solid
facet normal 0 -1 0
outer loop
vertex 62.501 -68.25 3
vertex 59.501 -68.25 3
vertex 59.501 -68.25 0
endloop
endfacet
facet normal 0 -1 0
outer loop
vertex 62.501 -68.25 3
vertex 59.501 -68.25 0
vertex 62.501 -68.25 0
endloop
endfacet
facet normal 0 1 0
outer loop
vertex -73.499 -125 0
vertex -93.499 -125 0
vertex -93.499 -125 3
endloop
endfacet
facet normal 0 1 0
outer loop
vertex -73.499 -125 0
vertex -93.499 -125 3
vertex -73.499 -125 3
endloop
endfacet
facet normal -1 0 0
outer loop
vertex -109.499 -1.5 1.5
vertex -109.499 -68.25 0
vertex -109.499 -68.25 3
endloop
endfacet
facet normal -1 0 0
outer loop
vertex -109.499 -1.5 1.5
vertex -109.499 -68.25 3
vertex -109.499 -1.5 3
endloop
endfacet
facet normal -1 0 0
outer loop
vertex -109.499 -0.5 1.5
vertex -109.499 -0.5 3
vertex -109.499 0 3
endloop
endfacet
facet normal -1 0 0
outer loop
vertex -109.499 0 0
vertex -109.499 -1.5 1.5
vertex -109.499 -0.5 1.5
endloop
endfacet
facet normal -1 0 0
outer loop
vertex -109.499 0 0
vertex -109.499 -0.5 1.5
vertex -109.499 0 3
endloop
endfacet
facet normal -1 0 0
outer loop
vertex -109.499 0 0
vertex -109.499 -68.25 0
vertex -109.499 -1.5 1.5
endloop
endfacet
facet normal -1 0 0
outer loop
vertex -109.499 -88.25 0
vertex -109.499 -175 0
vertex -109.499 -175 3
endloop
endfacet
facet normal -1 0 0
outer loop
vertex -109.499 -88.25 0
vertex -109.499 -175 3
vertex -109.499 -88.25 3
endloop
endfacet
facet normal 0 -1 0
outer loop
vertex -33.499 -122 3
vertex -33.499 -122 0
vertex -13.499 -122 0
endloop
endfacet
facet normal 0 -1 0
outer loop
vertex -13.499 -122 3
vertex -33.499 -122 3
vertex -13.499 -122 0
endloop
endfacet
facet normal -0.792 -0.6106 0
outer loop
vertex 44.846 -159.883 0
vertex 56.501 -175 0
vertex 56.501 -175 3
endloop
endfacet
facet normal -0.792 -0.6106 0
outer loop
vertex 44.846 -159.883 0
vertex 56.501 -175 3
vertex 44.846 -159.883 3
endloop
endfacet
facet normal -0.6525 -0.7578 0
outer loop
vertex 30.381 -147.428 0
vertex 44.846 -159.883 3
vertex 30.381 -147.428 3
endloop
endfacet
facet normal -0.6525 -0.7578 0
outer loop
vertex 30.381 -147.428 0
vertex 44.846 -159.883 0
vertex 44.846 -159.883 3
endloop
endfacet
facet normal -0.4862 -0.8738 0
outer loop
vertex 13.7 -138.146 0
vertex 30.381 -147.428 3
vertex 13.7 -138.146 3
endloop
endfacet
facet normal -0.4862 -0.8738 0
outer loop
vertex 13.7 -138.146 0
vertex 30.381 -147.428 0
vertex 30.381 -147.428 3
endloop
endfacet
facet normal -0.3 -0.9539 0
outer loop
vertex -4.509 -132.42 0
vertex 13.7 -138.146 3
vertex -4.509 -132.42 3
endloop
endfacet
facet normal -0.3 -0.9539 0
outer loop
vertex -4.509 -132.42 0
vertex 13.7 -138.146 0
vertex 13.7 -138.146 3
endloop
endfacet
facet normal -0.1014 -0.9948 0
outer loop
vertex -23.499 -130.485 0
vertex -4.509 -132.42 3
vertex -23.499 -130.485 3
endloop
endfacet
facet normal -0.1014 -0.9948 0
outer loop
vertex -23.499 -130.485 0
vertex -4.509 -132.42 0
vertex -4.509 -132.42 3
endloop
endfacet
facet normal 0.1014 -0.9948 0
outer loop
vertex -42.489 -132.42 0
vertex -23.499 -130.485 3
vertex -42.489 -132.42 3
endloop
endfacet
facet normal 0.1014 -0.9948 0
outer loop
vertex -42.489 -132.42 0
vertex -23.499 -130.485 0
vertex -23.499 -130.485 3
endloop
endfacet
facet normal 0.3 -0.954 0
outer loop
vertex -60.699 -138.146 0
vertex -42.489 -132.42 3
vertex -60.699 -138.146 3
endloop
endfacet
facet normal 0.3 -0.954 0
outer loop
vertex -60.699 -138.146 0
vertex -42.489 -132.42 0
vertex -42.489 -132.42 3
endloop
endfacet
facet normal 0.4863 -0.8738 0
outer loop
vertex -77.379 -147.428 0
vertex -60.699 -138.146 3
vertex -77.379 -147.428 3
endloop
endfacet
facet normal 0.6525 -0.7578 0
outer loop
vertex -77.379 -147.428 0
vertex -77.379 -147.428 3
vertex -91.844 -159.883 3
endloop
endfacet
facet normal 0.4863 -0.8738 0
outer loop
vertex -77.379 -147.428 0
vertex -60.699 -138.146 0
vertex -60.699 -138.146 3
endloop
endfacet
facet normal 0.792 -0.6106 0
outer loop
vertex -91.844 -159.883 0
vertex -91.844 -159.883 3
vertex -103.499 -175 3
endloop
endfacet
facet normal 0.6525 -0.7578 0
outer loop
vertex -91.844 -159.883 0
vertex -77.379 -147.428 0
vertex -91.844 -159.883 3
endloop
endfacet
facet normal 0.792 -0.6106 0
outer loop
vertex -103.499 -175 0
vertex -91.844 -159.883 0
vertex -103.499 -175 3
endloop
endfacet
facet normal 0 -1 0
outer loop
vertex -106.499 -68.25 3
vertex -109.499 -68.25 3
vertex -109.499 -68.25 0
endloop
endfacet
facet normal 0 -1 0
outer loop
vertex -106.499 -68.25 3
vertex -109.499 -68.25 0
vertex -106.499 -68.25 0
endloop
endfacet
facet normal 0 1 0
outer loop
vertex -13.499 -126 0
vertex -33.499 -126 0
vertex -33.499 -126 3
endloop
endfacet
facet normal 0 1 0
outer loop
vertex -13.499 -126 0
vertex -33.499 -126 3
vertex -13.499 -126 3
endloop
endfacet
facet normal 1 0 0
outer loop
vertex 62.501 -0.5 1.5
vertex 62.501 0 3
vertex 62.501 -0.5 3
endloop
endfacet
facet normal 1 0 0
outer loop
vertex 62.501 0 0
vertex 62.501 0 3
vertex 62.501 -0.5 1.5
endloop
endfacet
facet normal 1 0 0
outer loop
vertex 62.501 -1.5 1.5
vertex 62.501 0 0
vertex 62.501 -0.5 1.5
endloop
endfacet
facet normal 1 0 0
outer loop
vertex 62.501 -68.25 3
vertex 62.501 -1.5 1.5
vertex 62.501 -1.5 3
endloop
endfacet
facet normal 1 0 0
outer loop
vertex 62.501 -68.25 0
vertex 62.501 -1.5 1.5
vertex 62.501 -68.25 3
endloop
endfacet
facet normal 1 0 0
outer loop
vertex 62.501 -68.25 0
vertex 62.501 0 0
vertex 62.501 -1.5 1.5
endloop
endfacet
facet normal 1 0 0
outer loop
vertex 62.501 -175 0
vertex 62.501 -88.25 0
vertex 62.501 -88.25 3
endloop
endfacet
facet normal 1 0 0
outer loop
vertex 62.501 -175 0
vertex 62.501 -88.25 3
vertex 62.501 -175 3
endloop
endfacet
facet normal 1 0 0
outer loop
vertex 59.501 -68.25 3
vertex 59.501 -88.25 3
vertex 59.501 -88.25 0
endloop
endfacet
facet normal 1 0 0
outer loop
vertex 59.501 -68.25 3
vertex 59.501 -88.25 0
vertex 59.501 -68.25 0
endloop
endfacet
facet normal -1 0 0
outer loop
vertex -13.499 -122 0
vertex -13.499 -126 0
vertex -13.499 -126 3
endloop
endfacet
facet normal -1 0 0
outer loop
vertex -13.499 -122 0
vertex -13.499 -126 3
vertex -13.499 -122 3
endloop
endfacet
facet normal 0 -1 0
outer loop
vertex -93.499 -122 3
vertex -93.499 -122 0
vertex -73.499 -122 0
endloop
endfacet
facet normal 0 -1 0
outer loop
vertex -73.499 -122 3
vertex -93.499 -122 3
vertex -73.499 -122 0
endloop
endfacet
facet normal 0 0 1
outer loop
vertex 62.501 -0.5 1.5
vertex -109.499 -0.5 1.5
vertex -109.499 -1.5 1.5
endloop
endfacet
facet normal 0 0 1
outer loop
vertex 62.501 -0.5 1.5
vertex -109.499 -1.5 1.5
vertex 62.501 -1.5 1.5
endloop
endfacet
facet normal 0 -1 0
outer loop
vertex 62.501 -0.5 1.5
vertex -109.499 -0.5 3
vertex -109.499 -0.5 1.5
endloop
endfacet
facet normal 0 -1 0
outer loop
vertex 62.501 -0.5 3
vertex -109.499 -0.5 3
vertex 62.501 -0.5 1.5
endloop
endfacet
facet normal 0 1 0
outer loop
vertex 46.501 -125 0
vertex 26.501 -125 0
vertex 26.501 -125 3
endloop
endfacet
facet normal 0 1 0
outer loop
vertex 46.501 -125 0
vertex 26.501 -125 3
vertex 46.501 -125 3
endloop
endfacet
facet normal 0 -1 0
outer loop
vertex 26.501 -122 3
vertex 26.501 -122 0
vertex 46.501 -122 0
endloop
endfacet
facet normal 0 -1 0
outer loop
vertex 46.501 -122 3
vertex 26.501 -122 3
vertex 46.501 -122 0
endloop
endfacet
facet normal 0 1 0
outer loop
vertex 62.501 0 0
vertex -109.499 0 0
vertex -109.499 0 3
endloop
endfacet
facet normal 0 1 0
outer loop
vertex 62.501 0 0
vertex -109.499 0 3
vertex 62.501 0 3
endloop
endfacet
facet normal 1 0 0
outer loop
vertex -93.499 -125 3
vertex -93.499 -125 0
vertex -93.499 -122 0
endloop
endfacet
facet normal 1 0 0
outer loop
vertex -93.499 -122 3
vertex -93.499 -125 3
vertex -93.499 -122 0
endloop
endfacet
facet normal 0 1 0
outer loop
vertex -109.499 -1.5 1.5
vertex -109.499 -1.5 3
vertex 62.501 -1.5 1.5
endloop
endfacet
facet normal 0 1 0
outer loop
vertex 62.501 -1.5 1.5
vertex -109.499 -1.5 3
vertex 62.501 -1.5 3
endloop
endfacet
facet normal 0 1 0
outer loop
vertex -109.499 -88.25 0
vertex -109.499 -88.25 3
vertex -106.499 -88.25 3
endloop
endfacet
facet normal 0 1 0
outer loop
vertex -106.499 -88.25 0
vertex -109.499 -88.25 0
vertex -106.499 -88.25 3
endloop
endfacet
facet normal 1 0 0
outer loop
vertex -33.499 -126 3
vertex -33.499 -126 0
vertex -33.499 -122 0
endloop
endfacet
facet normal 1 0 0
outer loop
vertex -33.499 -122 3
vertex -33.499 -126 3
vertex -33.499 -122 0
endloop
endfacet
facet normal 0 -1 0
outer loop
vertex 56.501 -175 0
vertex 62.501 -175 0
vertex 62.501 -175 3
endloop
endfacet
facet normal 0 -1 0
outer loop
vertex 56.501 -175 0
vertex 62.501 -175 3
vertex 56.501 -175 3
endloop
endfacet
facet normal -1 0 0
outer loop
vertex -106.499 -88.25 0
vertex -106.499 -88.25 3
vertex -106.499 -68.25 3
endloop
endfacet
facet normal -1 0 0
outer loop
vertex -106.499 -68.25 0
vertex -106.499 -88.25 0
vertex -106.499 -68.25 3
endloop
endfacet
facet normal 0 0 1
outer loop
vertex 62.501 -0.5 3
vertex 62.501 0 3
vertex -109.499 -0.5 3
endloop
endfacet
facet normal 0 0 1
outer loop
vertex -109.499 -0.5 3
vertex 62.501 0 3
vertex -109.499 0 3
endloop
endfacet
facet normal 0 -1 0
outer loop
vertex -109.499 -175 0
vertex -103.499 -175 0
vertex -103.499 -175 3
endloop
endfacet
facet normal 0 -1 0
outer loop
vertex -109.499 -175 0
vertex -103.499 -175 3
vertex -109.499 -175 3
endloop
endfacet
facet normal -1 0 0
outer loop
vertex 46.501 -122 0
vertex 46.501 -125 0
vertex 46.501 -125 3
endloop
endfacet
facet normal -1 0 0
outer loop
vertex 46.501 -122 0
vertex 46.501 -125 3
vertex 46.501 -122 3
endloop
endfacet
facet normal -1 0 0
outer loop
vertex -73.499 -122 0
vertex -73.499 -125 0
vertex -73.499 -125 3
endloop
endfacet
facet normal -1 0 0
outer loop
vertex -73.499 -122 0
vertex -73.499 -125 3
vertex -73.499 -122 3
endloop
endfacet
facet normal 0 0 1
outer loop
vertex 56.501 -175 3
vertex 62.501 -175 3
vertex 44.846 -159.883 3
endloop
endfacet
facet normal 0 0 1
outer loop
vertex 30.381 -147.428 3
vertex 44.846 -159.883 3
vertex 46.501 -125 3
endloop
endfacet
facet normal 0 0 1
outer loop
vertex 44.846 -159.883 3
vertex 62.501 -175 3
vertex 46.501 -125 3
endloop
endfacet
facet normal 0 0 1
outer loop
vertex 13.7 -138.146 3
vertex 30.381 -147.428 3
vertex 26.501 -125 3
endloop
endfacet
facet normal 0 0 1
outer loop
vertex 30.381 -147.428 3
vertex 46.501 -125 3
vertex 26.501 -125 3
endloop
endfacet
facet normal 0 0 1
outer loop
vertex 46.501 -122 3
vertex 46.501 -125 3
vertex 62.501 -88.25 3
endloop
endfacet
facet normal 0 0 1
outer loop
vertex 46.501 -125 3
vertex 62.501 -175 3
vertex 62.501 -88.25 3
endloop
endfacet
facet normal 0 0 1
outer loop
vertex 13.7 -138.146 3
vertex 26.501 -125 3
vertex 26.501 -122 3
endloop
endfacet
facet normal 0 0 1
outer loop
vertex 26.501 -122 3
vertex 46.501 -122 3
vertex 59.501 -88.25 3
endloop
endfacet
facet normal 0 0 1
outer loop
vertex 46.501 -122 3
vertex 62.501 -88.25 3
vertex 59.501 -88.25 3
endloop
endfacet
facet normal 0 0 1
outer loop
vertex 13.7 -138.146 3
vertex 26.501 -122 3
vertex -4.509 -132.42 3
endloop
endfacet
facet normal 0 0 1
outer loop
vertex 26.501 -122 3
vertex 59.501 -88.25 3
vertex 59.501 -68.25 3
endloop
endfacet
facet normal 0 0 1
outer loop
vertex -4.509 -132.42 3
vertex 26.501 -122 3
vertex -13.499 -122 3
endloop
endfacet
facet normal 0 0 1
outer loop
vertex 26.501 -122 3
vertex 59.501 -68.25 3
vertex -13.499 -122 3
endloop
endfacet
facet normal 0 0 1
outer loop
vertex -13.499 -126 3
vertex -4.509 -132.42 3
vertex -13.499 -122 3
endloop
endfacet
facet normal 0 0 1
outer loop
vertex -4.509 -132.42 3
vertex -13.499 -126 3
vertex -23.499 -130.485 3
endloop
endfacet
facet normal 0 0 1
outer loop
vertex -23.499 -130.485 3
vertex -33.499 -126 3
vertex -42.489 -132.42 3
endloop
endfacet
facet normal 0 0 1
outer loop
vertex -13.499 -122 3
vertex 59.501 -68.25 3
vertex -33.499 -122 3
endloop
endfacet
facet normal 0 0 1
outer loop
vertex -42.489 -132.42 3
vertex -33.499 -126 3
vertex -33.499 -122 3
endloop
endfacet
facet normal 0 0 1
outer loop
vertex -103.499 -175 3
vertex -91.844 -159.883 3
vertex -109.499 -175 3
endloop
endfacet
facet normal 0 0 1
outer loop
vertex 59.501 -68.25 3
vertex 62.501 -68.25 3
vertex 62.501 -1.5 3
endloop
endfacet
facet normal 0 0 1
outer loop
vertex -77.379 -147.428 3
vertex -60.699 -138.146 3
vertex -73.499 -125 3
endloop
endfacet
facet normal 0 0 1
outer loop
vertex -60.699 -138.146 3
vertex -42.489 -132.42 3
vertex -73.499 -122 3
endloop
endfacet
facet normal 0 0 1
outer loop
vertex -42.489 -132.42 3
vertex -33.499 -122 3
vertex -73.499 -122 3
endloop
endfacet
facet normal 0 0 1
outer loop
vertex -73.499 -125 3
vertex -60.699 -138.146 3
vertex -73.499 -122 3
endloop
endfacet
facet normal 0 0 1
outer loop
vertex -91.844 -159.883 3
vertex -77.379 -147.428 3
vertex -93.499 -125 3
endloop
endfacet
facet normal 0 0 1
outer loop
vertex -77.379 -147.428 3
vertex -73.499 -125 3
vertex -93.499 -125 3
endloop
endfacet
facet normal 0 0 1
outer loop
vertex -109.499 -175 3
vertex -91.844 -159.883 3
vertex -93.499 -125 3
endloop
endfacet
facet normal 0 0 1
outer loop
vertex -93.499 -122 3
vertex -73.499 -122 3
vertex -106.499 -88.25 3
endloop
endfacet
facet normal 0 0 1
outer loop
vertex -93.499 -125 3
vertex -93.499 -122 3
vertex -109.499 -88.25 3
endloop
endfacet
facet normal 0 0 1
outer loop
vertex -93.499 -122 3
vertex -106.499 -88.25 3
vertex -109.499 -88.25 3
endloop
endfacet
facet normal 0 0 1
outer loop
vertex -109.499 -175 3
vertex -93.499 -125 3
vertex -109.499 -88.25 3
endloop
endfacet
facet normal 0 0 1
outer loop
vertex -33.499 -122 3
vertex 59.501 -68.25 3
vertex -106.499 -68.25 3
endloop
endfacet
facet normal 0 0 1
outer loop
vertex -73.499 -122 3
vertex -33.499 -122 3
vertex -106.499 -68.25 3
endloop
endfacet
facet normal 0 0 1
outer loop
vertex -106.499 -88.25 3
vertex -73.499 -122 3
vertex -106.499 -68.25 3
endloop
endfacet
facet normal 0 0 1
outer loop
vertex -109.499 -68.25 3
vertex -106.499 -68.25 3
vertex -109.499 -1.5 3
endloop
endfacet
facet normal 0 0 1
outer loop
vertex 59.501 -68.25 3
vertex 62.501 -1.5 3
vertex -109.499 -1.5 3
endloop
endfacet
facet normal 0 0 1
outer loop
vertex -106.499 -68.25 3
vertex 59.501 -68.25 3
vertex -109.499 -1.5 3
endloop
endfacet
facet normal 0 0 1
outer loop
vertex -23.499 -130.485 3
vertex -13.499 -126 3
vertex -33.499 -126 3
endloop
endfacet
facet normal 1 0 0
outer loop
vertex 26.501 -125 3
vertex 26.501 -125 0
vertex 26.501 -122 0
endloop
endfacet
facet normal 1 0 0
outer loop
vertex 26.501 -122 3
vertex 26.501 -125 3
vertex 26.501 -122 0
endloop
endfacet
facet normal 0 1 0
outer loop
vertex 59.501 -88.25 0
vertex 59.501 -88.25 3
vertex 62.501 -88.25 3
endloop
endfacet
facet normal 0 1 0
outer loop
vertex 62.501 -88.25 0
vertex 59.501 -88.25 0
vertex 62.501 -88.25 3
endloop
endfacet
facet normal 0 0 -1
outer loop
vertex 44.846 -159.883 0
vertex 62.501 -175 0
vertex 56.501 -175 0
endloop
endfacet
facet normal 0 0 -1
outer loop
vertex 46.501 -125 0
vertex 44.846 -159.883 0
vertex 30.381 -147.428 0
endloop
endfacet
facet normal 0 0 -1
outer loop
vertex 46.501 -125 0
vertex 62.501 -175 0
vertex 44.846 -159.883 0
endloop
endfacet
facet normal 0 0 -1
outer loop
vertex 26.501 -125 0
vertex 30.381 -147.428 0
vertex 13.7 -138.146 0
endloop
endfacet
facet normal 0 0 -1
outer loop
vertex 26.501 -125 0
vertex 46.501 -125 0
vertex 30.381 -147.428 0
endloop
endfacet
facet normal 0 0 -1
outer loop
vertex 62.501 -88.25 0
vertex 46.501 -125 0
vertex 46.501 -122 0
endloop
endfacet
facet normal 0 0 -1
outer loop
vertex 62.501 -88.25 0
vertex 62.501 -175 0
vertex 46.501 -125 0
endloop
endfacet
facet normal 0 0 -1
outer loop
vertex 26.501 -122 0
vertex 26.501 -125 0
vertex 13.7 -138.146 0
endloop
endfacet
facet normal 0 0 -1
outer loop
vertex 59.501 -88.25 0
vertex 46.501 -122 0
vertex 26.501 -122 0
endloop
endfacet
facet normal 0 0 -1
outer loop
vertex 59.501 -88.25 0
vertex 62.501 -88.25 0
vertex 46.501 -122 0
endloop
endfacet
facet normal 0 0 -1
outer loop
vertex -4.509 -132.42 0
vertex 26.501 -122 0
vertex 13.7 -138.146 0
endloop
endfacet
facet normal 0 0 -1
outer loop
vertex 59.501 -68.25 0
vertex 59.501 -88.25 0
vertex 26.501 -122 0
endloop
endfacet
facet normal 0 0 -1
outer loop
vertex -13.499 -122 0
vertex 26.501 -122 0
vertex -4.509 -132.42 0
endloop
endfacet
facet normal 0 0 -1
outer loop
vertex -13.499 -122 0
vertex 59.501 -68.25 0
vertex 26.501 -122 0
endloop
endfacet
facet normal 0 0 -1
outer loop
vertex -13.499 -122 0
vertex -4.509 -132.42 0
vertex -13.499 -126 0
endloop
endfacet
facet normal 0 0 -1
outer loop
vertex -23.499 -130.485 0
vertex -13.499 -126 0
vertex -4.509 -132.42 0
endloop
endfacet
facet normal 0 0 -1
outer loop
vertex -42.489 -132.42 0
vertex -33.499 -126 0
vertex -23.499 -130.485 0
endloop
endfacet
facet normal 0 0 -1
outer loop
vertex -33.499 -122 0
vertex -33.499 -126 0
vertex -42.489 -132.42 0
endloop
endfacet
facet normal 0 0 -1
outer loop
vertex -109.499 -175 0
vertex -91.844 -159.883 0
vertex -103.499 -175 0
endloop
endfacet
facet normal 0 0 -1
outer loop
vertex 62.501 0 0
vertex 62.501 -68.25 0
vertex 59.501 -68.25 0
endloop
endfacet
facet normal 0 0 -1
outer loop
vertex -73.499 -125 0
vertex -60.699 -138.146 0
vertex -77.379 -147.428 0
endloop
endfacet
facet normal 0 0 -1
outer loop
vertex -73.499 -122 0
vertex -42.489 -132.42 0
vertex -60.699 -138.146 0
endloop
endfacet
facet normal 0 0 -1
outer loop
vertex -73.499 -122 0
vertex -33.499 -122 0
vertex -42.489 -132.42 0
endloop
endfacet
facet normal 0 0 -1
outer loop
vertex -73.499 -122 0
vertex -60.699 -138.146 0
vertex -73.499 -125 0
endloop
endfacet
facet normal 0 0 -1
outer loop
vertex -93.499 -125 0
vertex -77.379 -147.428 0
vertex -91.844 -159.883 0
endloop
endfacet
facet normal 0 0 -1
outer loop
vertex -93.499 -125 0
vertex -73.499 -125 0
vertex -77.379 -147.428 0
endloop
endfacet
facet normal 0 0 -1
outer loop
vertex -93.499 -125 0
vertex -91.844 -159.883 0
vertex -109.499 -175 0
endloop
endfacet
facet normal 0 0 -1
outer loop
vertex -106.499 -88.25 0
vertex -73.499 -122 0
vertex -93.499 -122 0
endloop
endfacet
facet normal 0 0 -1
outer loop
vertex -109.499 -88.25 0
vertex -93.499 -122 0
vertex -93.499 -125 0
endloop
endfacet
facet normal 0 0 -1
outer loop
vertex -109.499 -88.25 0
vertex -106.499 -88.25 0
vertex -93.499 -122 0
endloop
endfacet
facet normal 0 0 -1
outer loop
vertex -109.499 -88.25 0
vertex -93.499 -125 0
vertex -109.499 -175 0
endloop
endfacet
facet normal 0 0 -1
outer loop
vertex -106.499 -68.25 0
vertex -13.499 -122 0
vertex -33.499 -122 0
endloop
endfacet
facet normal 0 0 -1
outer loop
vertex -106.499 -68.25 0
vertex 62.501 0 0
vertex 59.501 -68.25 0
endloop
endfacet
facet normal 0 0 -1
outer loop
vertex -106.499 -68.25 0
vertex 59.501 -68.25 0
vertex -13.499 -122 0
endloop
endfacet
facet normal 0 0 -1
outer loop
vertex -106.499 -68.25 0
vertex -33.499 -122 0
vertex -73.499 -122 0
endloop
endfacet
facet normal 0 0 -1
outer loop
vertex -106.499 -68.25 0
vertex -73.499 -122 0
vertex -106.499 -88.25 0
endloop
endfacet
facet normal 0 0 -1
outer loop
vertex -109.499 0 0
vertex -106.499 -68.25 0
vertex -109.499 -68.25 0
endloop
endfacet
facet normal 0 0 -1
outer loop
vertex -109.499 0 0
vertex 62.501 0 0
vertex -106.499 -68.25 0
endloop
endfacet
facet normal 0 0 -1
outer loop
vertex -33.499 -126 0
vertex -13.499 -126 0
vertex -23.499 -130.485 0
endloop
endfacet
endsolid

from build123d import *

# Parameters (mm, degrees)
ESQUISSE1_W             = 20
ESQUISSE1_H             = 3
ESQUISSE1_H_2           = 4
BOSS_EXTRU_1_DEPTH      = 3
ESQUISSE2_W             = 172
ESQUISSE2_H             = 1
ENL_V_MAT_EXTRU_1_DEPTH = 1.5
ESQUISSE4_W             = 3
ESQUISSE4_H             = 20
ENL_V_MAT_EXTRU_2_DEPTH = 207.455986147


with BuildPart() as part:
    # Esquisse1 → Boss.-Extru.1 (new body)
    with BuildSketch(Plane.XY):
        with BuildLine():
            Line((-109.499197329, 0), (62.500802671, 0))
            Line((62.500802671, 0), (62.500802671, -175))
            Line((62.500802671, -175), (56.500802671, -175))
            ThreePointArc((56.500802671, -175), (-23.499197329, -130.484780132), (-103.499197329, -175))
            Line((-103.499197329, -175), (-109.499197329, -175))
            Line((-109.499197329, -175), (-109.499197329, 0))
        make_face()
        with Locations((-83.499197329, -123.5)):
            Rectangle(ESQUISSE1_W, ESQUISSE1_H, mode=Mode.SUBTRACT)
        with Locations((-23.499197329, -124)):
            Rectangle(ESQUISSE1_W, ESQUISSE1_H_2, mode=Mode.SUBTRACT)
        with Locations((36.500802671, -123.5)):
            Rectangle(ESQUISSE1_W, ESQUISSE1_H, mode=Mode.SUBTRACT)
    extrude(amount=BOSS_EXTRU_1_DEPTH)

    # Esquisse2 → Enlèv. mat.-Extru.1 (cut)
    with BuildSketch(Plane.XY.offset(3)):
        with Locations((-23.499197329, -1)):
            Rectangle(ESQUISSE2_W, ESQUISSE2_H)
    extrude(amount=-ENL_V_MAT_EXTRU_1_DEPTH, mode=Mode.SUBTRACT)

    # Esquisse4 → Enlèv. mat.-Extru.2 (cut, through all)
    with BuildSketch(Plane.XY.offset(3)):
        with Locations((-107.999197329, -78.25)):
            Rectangle(ESQUISSE4_W, ESQUISSE4_H)
        with Locations((61.000802671, -78.25)):
            Rectangle(ESQUISSE4_W, ESQUISSE4_H)
    extrude(amount=-ENL_V_MAT_EXTRU_2_DEPTH, mode=Mode.SUBTRACT)


solid = part.part
